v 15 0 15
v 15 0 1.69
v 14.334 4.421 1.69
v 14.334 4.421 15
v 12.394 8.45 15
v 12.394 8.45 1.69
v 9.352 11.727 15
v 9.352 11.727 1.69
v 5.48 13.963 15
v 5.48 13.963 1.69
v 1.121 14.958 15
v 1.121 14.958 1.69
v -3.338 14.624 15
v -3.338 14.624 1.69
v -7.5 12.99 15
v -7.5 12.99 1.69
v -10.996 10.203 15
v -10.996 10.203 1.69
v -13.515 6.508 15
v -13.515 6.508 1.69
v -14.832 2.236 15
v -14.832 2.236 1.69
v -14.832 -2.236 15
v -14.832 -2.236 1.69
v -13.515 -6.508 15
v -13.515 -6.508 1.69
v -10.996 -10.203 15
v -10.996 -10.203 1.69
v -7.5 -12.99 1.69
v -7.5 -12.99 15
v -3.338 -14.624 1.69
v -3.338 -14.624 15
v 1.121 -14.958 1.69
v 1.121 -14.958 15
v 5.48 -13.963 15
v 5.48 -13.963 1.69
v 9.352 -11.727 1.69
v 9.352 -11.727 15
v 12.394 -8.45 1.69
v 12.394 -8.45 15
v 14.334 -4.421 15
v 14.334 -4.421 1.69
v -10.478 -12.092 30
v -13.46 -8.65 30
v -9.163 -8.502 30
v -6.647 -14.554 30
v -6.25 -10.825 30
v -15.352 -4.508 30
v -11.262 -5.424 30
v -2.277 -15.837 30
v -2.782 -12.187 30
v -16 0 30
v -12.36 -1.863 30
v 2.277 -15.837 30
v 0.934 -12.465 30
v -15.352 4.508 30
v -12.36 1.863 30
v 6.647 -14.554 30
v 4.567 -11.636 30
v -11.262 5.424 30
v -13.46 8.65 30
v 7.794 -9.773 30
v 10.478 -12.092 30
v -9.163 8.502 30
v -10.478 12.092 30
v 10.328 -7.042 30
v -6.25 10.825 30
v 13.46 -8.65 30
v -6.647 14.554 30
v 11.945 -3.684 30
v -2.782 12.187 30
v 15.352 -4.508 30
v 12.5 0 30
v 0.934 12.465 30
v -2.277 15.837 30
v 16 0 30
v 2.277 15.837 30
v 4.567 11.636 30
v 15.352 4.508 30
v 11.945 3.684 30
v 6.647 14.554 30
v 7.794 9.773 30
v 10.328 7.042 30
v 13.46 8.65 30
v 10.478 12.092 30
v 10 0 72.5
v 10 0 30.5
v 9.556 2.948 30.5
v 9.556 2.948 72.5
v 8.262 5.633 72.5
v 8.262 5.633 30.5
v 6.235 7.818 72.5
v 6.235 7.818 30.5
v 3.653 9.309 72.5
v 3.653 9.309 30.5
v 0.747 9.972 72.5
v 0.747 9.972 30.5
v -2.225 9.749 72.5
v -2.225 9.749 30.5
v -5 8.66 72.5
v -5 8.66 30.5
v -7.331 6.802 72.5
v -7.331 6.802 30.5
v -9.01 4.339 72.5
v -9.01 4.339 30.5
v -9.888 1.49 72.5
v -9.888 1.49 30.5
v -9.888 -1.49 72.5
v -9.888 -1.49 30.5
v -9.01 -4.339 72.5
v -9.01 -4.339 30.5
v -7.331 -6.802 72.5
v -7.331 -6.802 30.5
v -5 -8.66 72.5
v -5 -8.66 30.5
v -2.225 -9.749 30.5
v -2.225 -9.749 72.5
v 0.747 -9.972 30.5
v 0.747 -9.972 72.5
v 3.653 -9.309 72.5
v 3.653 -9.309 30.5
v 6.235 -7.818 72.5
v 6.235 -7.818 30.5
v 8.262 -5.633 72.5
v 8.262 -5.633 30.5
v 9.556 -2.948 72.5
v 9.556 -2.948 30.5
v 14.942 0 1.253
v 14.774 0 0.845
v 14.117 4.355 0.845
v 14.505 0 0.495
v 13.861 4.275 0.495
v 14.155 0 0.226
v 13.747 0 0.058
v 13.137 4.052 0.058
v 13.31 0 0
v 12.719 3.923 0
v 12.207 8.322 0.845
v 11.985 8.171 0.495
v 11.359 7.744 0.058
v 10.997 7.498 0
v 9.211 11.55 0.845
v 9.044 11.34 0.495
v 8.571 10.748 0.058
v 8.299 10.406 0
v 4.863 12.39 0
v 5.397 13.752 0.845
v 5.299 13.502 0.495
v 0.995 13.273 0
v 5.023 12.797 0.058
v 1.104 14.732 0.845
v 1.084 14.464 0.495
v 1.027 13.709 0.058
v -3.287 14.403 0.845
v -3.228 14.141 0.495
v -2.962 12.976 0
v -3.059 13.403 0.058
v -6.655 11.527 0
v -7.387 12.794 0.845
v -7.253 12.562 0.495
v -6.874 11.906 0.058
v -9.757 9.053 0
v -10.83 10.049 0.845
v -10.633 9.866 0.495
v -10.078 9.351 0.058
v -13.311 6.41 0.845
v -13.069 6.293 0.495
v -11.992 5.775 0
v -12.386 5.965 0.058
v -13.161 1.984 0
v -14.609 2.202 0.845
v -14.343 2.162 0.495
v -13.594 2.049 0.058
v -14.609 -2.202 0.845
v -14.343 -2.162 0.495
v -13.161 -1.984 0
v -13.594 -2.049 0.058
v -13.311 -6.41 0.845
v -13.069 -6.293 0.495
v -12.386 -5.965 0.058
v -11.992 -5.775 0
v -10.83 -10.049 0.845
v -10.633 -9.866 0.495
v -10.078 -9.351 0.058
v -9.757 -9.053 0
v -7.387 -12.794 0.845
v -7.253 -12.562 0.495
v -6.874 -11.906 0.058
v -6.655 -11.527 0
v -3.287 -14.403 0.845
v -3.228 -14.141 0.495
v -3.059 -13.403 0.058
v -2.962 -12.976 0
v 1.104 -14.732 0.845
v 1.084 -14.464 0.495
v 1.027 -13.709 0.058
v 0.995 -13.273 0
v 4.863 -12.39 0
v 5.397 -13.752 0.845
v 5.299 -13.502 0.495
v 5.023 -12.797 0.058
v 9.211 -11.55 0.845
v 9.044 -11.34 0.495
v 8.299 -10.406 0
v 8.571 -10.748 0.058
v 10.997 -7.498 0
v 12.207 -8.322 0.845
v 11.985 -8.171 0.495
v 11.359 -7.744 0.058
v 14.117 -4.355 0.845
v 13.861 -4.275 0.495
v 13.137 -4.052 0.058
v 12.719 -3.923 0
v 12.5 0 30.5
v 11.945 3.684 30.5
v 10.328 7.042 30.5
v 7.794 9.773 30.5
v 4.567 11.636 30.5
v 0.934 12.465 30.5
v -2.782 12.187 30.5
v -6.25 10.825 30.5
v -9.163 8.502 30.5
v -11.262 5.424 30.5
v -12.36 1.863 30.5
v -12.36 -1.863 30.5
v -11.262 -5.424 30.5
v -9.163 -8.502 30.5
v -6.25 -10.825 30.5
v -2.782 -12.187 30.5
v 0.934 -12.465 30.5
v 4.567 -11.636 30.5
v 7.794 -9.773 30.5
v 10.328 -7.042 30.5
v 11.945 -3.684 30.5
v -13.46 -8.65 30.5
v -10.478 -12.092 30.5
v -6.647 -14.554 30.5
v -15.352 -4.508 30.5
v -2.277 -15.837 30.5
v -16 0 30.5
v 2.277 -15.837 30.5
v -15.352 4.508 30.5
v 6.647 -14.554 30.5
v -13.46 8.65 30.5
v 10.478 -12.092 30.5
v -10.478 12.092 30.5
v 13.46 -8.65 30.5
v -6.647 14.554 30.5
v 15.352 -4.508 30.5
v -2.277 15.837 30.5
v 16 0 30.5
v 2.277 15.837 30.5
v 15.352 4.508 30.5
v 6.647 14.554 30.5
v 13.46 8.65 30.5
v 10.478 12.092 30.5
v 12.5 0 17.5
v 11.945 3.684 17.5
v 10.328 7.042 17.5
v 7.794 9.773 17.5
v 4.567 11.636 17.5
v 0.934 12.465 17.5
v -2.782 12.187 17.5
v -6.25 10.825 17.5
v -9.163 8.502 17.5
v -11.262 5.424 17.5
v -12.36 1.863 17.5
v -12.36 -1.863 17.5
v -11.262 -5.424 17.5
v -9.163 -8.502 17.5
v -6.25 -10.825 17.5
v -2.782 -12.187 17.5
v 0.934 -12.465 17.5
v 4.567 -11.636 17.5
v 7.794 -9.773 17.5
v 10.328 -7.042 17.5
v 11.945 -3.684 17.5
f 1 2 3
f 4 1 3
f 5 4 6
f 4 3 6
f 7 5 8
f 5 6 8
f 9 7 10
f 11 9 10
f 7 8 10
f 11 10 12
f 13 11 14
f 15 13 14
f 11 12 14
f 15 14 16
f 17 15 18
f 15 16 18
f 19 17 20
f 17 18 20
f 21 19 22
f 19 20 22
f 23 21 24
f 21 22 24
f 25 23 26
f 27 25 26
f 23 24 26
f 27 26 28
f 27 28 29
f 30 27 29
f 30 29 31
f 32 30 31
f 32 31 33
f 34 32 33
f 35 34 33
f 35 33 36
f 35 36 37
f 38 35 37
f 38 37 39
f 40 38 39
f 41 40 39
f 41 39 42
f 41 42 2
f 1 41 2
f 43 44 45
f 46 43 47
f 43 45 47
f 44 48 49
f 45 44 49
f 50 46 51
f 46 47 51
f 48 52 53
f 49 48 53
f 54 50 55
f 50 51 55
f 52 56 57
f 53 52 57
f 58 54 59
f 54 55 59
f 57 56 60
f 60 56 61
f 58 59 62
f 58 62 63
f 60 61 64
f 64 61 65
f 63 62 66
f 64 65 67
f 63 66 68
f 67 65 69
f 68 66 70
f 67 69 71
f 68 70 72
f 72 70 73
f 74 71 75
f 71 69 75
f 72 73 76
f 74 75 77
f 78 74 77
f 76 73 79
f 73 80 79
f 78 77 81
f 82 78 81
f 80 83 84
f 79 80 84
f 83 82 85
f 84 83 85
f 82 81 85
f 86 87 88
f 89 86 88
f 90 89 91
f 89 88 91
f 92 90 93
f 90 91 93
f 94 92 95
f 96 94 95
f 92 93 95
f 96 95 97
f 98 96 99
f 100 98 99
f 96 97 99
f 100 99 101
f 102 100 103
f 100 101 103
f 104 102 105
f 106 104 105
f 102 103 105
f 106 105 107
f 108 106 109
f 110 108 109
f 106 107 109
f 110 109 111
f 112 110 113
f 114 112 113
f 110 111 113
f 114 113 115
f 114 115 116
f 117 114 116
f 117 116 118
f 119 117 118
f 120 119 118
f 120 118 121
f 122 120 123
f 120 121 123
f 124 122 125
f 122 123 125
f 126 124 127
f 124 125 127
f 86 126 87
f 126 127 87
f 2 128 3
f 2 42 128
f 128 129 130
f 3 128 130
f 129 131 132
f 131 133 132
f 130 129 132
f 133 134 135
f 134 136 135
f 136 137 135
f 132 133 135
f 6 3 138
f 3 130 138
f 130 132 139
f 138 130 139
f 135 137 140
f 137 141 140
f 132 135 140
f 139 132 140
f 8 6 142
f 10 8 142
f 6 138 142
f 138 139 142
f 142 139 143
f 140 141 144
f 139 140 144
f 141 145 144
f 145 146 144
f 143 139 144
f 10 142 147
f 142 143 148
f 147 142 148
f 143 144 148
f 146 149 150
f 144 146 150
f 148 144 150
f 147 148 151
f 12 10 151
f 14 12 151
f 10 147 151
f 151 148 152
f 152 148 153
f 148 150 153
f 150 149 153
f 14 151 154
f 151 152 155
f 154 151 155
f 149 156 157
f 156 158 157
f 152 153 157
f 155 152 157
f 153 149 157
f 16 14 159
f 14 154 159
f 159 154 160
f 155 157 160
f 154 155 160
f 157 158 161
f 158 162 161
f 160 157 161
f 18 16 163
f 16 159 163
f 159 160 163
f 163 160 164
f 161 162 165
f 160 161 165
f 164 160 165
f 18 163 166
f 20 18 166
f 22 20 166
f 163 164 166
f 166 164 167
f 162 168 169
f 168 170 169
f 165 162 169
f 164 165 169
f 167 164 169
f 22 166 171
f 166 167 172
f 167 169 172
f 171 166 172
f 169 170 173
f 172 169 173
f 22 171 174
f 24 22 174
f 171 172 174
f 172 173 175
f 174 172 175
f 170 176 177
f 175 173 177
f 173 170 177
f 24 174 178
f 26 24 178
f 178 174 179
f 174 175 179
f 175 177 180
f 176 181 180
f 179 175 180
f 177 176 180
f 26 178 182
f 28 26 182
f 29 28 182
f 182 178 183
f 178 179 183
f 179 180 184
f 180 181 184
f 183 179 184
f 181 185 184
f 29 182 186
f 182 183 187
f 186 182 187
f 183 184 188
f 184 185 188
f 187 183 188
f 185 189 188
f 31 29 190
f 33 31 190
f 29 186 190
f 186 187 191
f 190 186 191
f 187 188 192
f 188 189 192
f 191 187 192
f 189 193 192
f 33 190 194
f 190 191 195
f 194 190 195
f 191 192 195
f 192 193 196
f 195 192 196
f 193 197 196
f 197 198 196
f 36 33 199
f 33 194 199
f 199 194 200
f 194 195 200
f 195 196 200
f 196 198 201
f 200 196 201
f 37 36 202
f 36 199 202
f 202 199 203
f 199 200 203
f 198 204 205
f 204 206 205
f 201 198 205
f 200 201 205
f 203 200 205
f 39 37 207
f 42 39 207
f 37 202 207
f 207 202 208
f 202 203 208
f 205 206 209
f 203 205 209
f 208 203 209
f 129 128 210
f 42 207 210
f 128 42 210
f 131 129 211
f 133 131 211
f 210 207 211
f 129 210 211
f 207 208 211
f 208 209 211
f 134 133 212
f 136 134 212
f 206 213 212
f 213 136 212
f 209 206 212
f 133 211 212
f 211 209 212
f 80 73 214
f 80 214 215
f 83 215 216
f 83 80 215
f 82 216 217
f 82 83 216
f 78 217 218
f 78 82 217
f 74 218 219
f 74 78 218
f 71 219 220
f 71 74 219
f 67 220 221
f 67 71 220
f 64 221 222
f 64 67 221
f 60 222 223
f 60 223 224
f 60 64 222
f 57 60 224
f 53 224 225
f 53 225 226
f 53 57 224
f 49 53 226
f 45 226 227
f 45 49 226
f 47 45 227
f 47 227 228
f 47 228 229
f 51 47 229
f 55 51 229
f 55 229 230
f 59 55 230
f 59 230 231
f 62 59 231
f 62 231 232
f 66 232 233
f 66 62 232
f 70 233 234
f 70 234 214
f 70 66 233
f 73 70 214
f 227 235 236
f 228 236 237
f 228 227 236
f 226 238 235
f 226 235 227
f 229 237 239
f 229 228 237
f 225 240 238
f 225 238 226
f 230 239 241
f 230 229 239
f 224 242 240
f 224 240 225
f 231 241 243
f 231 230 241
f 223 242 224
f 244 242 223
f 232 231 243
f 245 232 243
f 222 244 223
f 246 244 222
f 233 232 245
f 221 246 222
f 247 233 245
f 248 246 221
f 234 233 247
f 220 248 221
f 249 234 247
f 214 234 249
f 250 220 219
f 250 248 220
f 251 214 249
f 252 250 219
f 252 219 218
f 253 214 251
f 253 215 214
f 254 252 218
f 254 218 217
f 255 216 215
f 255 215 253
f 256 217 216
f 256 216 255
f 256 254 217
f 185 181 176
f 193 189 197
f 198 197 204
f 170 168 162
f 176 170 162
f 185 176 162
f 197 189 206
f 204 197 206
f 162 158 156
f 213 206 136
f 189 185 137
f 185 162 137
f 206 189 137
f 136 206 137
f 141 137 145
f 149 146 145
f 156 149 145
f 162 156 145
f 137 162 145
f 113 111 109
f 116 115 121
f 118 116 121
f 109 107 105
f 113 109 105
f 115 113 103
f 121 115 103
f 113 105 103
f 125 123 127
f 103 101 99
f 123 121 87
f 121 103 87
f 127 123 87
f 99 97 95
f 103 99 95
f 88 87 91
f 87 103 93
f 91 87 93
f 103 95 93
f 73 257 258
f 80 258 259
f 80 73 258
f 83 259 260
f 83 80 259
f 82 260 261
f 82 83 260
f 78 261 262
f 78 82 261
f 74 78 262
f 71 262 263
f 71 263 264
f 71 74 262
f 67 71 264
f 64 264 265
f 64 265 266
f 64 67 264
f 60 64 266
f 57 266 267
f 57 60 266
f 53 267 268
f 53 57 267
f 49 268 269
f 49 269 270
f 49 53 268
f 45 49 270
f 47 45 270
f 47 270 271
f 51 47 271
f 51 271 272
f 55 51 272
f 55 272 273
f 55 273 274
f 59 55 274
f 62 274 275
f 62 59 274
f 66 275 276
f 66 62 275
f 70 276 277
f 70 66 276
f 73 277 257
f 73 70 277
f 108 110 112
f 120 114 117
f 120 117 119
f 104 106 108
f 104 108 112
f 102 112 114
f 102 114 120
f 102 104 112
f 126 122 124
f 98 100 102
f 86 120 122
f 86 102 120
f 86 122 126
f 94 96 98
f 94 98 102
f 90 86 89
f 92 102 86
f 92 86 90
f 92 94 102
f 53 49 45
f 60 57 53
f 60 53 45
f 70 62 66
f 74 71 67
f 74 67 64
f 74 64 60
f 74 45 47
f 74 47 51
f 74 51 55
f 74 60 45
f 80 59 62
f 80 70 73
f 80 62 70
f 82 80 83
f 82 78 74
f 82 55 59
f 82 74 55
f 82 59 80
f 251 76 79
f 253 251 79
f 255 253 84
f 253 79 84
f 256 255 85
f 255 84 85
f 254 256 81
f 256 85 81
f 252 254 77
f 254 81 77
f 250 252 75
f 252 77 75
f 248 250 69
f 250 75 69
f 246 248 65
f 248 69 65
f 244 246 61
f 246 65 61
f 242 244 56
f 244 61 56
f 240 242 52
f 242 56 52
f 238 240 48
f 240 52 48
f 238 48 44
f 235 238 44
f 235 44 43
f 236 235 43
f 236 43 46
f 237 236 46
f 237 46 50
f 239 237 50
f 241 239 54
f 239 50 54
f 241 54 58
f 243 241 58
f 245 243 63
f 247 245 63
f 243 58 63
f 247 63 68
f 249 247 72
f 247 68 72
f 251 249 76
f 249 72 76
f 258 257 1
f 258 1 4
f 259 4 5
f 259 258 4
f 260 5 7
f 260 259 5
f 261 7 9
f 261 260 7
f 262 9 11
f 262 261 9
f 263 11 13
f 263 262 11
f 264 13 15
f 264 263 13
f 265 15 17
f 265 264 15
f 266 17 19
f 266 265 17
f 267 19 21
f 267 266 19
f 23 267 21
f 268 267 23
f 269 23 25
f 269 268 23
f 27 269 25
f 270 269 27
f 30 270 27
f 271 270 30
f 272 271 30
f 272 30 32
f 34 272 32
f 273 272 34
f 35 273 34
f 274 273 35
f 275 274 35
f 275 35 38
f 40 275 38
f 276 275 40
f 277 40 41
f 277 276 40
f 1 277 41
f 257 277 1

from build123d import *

# Parameters (mm, degrees)
F0_R        = 15
F1_DEPTH    = 20
F2_R        = 12.5
F3_DEPTH    = 10
F4_R        = 16
F4_R_2      = 12.5
F5_DEPTH    = 0.5
F6_R        = 10
F7_DEPTH    = 42
F8_R        = 1.6899494937
F9_S5_R     = 12.5
F9_T6_DEPTH = 23


# Not quite as in the source:
# - a fillet or chamfer that OpenCascade refuses, or shapes differently, is made with other operations: its cross-section is extruded or revolved along the edge and cut away or added


with BuildPart() as f1:
    # F0 (on Top) → F1 (new body)
    with BuildSketch(Plane.XY):
        Circle(F0_R)
    extrude(amount=F1_DEPTH)

    # F2 (on face) → F3 (join)
    with BuildSketch(Plane.XY.offset(20)):
        Circle(F2_R)
    extrude(amount=F3_DEPTH)

    # F8
    f8_edges = [f1.edges().sort_by_distance(p)[0] for p in [
        (-15, 0, 0),
    ]]
    fillet(f8_edges, radius=F8_R)

    # F9: chamfer of 5 on 1 edges, made by hand


with BuildPart() as f5:
    # F4 (on face) → F5 (new body)
    with BuildSketch(Plane.XY.offset(30)):
        Circle(F4_R)
        Circle(F4_R_2, mode=Mode.SUBTRACT)
    extrude(amount=F5_DEPTH)


with BuildPart() as f7:
    # F6 (on face) → F7 (new body)
    with BuildSketch(Plane.XY.offset(30.5)):
        Circle(F6_R)
    extrude(amount=F7_DEPTH)


with BuildPart() as f9_tool2:
    # F9_s3 → F9_t4 (revolve)
    with BuildSketch(Plane.XZ):
        Polygon((15, 15), (10, 20), (15, 20), align=None)
    revolve(axis=Axis((0, 0, 20), (0, 0, 1)))

    # F9_s5 → F9_t6 (cut, symmetric)
    with BuildSketch(Plane.XY.offset(17.5)):
        Circle(F9_S5_R)
    extrude(amount=F9_T6_DEPTH, both=True, mode=Mode.SUBTRACT)


with BuildPart() as f1_1:
    add(f1.part)

    # F9_t1: cut F9_tool2
    add(f9_tool2.part, mode=Mode.SUBTRACT)


solid = Compound([f5.part, f7.part, f1_1.part])
